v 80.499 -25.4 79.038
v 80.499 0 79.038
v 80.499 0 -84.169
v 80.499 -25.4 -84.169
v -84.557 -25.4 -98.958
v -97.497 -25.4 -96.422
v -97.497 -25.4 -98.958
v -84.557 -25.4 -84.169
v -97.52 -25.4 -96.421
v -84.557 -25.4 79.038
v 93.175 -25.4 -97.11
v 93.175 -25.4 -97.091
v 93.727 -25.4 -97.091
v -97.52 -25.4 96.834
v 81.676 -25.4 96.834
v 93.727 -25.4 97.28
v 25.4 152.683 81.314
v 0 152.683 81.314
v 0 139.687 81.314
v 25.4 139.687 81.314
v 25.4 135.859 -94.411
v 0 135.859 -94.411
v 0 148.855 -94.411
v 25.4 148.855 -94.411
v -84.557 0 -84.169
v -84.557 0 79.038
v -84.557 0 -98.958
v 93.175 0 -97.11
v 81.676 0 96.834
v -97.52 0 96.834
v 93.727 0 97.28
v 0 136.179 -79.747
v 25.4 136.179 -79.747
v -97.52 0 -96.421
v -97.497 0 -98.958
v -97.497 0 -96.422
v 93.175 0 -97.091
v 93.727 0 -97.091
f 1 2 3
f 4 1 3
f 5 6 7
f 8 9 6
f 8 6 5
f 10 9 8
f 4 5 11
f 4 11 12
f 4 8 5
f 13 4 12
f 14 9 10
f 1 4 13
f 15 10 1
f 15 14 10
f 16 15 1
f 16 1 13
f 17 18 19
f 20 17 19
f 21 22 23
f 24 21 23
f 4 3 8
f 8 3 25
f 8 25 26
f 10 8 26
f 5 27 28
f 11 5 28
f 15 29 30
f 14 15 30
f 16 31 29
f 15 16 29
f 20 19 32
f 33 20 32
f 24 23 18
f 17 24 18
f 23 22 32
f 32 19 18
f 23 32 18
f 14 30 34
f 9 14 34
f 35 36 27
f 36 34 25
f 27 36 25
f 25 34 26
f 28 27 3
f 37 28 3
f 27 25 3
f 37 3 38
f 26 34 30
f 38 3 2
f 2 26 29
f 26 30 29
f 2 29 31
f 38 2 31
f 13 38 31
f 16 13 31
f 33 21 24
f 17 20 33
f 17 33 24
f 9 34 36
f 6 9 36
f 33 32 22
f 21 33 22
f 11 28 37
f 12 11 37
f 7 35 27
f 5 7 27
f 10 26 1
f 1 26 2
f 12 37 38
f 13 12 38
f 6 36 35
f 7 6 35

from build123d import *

# Parameters (mm, degrees)
F1_DEPTH = 25.4
F3_DEPTH = 25.4
F5_DEPTH = 25.4


with BuildPart() as f1:
    # F0 (on Front) → F1 (new body)
    with BuildSketch(Plane.XZ):
        Polygon((93.72651577, -97.0906019211), (93.72651577, 97.2803458571), (81.6759616137, 96.8339592218), (81.6759616137, 80.0969600677), (81.6759616137, -84.5939666033), (81.6759616137, -97.0906019211), align=None)
        Polygon((81.6759616137, 80.0969600677), (81.6759616137, 96.8339592218), (-97.5202396512, 96.8339592218), (-97.5202396512, 80.0969600677), (-86.3623321056, 80.0969600677), align=None)
        Polygon((-86.3623321056, -96.8676805496), (81.6759616137, -97.0906019211), (81.6759616137, -84.5939666033), (-86.3623321056, -84.5939666033), align=None)
        Polygon((-97.5202396512, -96.4213907719), (-86.3623321056, -96.8676805496), (-86.3623321056, -84.5939666033), (-86.3623321056, 80.0969600677), (-97.5202396512, 80.0969600677), align=None)
    extrude(amount=F1_DEPTH)

    # F2 (on Front) → F3 (join)
    with BuildSketch(Plane.XZ):
        Polygon((-84.5567584038, 96.4676588774), (-97.4971503019, 96.2035655975), (-97.4971503019, -98.9583730698), (-84.5567584038, -98.9583730698), (-84.5567584038, -84.1693580151), (-84.5567584038, 79.0377706289), align=None)
        Polygon((93.4393554926, 96.4676588774), (-84.5567584038, 96.4676588774), (-84.5567584038, 79.0377706289), (80.4989784956, 79.0377706289), (93.1752547622, 79.0377706289), align=None)
        Polygon((80.4989784956, -96.5815484524), (-84.5567584038, -98.9583730698), (93.1752547622, -97.1097052097), (93.1752547622, 79.0377706289), (80.4989784956, 79.0377706289), (80.4989784956, -84.1693580151), align=None)
        Polygon((-84.5567584038, -84.1693580151), (-84.5567584038, -98.9583730698), (80.4989784956, -96.5815484524), (80.4989784956, -84.1693580151), align=None)
    extrude(amount=F3_DEPTH)


with BuildPart() as f5:
    # F4 (on Right) → F5 (new body)
    with BuildSketch(Plane.YZ):
        Polygon((148.8548964262, -94.4111868739), (152.6828855276, 81.3141465187), (139.6872550249, 81.3141465187), (136.1787137475, -79.7468098621), (135.8592659235, -94.4111868739), align=None)
    extrude(amount=F5_DEPTH)


solid = Compound([f1.part, f5.part])
